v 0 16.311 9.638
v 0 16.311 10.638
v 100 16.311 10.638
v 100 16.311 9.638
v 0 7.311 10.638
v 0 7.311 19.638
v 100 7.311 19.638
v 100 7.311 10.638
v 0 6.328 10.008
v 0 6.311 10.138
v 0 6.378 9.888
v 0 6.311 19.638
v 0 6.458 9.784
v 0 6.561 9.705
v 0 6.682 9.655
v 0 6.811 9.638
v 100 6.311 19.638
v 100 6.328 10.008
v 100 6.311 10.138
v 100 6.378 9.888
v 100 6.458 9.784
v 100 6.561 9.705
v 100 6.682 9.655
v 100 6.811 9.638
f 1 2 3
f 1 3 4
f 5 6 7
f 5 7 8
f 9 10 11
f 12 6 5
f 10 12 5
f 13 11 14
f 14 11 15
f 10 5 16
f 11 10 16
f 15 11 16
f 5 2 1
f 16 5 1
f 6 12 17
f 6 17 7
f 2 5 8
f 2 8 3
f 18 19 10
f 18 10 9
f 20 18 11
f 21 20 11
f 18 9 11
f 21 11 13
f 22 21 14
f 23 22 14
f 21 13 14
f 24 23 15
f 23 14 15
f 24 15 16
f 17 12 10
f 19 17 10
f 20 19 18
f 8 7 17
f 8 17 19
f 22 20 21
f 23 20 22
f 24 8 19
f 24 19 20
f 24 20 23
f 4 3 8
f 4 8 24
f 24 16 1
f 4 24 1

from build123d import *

# Parameters (mm, degrees)
SKETCH1_W           = 9
SKETCH1_H           = 1
SKETCH1_W_2         = 1
SKETCH1_H_2         = 9
BOSS_EXTRUDE1_DEPTH = 100


with BuildPart() as part:
    # Sketch1 → Boss-Extrude1 (new body)
    with BuildSketch(Plane(origin=(0, 0, 0), x_dir=(0, 0, -1), z_dir=(1, 0, 0))):
        with Locations((-15.137894846, 6.81112979)):
            Rectangle(SKETCH1_W, SKETCH1_H)
        with Locations((-10.137894846, 11.81112979)):
            Rectangle(SKETCH1_W_2, SKETCH1_H_2)
        with BuildLine():
            Line((-9.637894846, 7.31112979), (-10.637894846, 7.31112979))
            Line((-10.637894846, 7.31112979), (-10.637894846, 6.31112979))
            Line((-10.637894846, 6.31112979), (-10.137894846, 6.31112979))
            ThreePointArc((-10.137894846, 6.31112979), (-9.784341456, 6.4575764), (-9.637894846, 6.81112979))
            Line((-9.637894846, 6.81112979), (-9.637894846, 7.31112979))
        make_face()
    extrude(amount=BOSS_EXTRUDE1_DEPTH)


solid = part.part
